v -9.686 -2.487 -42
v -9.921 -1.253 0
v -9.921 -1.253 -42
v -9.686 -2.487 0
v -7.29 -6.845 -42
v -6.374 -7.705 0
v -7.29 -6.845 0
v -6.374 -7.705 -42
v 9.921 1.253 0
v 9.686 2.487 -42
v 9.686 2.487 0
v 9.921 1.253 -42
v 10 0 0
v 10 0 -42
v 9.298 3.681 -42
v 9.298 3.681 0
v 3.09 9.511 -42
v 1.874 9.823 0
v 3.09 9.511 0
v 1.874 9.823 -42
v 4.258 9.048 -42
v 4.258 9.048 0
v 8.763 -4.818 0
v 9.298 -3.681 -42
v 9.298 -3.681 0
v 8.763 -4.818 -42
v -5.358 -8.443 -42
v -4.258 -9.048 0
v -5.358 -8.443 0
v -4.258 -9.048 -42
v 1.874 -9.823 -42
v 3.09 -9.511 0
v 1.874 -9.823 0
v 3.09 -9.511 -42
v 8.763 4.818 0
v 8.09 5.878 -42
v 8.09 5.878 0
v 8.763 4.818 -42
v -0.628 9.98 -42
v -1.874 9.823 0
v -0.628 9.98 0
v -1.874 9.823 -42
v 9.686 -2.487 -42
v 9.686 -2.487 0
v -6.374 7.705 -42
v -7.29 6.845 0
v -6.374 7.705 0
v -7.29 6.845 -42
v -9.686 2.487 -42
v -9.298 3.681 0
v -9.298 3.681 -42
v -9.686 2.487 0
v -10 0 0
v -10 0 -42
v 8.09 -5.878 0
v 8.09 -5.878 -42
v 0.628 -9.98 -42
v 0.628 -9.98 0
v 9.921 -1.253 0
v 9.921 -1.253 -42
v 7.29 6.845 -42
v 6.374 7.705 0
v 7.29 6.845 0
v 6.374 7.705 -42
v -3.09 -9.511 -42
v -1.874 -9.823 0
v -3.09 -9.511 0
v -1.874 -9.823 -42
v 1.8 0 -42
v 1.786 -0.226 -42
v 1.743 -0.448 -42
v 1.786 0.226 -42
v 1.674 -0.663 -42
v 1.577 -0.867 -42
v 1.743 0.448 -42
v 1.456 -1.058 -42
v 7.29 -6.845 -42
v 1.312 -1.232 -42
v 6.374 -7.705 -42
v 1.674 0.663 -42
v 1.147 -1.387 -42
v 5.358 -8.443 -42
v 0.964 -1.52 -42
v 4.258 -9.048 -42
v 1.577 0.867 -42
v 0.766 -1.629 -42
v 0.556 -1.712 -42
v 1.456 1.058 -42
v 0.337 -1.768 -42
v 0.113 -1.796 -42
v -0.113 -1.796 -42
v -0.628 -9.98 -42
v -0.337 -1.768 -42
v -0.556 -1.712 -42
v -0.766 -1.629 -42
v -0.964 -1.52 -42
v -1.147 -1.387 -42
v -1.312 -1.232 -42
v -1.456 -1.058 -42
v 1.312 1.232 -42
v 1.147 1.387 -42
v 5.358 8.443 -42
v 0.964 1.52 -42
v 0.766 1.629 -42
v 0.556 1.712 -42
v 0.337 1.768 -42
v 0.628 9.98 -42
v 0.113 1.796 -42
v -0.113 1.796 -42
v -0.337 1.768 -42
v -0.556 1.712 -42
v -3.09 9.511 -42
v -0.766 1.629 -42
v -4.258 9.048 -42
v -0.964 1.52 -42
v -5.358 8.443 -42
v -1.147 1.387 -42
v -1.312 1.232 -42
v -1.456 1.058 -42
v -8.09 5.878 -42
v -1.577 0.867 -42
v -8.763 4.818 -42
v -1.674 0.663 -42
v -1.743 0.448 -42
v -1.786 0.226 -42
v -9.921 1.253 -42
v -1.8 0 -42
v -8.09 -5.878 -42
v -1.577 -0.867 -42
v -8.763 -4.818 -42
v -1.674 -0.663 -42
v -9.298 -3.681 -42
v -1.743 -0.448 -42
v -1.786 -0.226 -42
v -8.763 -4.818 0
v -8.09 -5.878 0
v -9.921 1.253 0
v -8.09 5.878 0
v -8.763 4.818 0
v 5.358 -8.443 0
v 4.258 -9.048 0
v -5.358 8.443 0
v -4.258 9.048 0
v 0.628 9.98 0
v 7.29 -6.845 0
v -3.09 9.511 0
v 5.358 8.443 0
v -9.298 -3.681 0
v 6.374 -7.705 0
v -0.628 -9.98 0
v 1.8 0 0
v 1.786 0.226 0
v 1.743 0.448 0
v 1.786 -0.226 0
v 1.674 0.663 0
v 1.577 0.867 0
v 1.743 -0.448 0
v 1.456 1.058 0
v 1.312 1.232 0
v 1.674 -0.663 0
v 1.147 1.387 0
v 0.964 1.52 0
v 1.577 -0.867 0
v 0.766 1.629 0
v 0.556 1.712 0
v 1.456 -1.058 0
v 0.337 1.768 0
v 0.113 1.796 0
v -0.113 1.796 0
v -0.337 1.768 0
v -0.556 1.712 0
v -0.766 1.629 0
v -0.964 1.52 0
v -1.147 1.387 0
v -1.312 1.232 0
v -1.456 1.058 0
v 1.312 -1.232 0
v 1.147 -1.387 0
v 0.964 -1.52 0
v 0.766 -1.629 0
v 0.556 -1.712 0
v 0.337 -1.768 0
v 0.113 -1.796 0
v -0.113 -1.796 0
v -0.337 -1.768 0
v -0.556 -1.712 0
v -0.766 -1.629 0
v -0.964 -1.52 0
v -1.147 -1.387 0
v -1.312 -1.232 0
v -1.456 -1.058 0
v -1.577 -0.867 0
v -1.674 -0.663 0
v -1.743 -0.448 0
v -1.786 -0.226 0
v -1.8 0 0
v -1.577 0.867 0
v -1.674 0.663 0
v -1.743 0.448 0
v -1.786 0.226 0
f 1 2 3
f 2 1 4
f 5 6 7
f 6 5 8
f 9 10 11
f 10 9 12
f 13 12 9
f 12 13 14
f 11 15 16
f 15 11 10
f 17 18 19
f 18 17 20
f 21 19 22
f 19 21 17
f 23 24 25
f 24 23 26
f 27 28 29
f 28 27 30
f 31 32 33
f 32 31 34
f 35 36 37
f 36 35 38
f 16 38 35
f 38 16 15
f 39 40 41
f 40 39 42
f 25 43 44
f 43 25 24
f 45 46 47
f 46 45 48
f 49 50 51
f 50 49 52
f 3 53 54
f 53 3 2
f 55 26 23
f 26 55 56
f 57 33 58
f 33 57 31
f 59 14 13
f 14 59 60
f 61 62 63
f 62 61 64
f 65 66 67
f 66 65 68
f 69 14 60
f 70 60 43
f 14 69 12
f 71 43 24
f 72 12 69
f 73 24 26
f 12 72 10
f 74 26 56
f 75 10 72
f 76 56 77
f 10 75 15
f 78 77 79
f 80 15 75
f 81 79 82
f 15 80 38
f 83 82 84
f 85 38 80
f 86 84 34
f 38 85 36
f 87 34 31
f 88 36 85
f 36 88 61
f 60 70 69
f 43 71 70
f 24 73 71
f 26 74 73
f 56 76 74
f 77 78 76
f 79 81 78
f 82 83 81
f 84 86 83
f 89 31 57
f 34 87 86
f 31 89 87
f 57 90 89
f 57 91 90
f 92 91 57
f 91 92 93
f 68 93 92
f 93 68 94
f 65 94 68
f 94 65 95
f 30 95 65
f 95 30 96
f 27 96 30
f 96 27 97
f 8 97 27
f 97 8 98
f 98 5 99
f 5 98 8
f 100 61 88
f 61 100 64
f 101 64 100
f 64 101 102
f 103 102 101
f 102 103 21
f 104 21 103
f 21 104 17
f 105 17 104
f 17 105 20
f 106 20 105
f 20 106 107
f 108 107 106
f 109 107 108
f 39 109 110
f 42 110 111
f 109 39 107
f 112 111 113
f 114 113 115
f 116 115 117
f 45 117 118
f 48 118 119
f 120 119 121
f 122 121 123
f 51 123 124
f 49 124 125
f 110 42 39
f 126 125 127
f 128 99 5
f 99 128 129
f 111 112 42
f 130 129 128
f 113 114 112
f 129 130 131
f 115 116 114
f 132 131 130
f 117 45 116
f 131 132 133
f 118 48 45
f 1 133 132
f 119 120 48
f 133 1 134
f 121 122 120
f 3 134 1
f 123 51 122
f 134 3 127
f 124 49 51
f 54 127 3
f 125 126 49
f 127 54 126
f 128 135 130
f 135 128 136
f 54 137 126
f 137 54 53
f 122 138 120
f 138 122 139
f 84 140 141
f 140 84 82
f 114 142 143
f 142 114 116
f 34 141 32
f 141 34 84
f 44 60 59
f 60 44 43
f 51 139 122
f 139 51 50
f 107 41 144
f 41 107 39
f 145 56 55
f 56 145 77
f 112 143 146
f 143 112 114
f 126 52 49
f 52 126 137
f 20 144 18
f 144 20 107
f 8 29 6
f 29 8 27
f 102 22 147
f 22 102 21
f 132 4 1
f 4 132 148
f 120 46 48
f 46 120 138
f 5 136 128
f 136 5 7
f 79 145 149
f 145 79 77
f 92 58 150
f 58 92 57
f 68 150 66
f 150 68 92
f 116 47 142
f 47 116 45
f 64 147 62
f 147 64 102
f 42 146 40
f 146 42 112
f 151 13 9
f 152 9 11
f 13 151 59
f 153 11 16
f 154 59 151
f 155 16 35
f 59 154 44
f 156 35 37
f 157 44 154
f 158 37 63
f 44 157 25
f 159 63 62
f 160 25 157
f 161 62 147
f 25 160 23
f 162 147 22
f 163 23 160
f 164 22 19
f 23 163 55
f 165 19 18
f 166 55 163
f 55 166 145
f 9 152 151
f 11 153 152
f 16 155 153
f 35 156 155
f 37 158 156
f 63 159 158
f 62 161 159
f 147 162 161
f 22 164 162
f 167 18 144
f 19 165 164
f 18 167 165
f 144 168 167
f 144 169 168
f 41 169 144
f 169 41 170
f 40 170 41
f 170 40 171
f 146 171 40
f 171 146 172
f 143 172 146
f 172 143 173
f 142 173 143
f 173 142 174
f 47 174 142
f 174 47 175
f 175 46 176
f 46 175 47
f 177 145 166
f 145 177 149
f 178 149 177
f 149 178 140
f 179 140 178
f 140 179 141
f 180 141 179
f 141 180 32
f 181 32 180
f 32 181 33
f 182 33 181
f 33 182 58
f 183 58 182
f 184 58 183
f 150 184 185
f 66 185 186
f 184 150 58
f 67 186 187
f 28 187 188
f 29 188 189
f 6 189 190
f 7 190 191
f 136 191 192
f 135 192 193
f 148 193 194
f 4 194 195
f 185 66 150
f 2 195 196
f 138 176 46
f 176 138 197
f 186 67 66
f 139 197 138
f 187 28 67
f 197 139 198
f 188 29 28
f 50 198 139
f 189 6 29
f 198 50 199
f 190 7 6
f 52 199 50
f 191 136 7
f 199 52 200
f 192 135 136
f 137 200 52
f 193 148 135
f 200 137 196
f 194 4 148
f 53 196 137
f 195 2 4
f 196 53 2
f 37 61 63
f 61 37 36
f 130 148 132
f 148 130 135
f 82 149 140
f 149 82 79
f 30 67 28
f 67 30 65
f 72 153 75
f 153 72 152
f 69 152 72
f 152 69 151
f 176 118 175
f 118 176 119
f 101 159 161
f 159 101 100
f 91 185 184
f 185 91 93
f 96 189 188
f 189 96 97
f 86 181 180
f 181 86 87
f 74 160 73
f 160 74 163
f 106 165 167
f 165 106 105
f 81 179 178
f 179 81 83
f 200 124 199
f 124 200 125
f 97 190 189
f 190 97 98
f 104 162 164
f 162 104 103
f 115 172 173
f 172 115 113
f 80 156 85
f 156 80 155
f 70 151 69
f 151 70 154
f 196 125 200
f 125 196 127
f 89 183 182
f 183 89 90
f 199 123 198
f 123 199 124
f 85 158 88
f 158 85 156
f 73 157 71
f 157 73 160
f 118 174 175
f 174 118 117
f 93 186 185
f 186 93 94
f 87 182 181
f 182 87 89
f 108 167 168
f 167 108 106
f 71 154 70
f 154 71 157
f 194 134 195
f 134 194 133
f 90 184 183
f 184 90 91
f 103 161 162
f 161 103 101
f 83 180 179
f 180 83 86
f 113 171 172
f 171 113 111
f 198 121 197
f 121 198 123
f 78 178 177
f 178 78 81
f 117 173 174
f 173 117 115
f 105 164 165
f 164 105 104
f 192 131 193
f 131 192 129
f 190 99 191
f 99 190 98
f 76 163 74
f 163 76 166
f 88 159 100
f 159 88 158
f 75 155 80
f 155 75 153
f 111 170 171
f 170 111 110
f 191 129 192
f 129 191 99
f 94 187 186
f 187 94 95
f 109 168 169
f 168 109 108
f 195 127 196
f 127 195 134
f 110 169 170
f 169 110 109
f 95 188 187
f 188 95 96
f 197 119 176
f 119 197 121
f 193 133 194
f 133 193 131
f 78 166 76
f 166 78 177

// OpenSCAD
$fn = 50;


difference() {
	union() {
		translate(v = [0, 0, -42.0000000000]) {
			cylinder(h = 42, r = 10.0000000000);
		}
		cylinder(h = 0, r = 16.0000000000);
	}
	union() {
		#translate(v = [0, 0, -42]) {
			cylinder(h = 42, r = 1.8000000000);
		}
	}
}
